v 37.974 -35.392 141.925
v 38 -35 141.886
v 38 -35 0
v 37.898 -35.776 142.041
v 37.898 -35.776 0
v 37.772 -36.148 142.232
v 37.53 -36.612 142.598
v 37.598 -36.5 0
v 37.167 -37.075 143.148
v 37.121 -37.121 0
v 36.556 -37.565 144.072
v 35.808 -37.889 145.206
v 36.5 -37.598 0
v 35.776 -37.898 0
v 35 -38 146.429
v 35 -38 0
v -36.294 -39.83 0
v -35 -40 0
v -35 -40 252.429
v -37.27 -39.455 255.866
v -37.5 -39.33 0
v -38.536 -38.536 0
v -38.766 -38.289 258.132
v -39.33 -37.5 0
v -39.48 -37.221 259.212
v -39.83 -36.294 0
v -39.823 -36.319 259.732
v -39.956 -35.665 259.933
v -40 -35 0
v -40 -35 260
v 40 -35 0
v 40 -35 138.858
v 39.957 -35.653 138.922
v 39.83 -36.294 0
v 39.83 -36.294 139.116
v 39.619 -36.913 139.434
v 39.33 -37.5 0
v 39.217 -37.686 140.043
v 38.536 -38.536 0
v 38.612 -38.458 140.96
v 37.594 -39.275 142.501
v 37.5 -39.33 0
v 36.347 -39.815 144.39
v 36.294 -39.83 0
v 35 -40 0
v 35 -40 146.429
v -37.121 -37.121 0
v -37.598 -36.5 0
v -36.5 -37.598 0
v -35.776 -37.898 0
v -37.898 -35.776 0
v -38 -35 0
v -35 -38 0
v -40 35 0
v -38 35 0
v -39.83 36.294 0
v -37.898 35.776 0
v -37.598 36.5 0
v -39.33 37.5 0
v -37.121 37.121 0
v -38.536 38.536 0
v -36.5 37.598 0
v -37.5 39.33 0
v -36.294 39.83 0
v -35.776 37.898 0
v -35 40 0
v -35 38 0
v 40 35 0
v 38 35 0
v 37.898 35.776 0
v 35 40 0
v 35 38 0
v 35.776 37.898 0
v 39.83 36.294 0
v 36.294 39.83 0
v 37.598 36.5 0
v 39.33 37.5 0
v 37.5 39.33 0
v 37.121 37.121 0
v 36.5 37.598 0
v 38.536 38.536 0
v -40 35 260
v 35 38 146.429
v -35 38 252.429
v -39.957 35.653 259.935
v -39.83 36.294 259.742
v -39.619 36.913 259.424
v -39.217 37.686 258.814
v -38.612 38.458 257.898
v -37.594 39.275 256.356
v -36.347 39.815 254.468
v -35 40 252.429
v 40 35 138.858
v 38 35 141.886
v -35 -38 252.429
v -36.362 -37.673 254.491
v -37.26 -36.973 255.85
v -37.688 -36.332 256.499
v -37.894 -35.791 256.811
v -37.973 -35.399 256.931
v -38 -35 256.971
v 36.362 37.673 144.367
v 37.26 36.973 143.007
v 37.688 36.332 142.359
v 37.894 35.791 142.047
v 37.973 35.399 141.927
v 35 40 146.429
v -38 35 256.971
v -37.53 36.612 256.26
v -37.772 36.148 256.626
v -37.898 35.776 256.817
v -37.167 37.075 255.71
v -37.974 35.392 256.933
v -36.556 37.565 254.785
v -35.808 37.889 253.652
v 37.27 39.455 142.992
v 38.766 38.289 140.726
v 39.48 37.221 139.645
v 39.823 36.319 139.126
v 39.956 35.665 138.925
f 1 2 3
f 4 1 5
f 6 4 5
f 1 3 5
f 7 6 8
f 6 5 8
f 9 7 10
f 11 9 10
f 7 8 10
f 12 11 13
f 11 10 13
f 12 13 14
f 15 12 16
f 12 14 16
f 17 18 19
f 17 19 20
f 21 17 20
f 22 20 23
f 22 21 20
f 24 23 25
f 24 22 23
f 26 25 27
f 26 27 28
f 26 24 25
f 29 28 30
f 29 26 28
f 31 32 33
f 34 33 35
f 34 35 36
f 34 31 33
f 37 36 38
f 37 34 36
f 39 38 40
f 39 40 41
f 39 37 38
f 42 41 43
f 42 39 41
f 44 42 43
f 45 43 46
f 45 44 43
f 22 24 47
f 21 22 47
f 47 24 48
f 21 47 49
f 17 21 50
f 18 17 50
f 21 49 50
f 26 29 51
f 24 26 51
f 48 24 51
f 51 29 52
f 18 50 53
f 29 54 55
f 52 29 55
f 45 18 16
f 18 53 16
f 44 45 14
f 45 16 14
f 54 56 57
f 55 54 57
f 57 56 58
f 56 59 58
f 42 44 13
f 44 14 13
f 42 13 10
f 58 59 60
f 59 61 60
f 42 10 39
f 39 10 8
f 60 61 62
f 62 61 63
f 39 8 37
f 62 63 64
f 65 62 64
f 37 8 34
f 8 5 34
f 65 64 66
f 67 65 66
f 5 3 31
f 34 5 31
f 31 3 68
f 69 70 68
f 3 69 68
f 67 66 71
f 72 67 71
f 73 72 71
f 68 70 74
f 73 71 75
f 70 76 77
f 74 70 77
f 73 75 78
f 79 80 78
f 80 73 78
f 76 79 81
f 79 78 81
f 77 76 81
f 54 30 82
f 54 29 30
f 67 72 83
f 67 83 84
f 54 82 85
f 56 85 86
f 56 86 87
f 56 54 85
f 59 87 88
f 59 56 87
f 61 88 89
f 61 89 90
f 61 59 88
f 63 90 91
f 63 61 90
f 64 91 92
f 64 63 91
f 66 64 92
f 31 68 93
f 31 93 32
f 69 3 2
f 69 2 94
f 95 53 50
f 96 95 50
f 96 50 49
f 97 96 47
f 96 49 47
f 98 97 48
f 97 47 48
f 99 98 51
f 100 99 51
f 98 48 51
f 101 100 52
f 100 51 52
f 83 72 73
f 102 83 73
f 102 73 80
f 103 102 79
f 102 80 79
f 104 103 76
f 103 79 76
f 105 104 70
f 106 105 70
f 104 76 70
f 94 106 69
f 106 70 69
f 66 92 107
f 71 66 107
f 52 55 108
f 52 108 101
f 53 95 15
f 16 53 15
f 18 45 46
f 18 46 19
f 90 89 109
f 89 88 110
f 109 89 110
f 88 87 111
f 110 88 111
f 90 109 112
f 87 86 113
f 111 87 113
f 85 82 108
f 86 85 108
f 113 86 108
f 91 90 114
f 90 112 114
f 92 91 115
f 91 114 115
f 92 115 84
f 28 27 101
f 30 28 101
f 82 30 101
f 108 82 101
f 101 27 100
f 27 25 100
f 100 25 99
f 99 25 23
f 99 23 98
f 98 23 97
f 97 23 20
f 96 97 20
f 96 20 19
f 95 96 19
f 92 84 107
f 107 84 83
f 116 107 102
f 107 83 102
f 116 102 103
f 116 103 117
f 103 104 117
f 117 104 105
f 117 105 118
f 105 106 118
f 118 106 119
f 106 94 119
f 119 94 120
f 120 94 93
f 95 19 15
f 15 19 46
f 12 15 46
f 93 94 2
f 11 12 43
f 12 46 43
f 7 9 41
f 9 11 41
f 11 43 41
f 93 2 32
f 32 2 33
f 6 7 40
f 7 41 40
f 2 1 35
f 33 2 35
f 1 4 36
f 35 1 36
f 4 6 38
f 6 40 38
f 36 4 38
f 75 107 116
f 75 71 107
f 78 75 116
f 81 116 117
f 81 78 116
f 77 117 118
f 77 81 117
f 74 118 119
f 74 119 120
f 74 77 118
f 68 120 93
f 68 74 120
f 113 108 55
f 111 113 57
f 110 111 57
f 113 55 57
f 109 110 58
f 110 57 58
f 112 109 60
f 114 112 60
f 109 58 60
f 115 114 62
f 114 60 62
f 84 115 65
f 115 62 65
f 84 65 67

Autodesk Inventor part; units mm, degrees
ref_plane "YZ Plane" through (0, 0, 0) normal (1, 0, 0) x (0, 1, 0)
ref_plane "XZ Plane" through (0, 0, 0) normal (0, 1, 0) x (-1, 0, 0)
ref_plane "XY Plane" through (0, 0, 0) normal (0, 0, 1) x (1, 0, 0)
sketch "Sketch1" plane through (0, 0, 0) normal (0, 0, 1) x (1, 0, 0)
  line L0 (-35, 40) -> (35, 40)
  line L1 (40, 35) -> (40, -35)
  line L2 (35, -40) -> (-35, -40)
  line L3 (-40, -35) -> (-40, 35)
  line L4 (-40, 40) -> (40, -40) construction
  line L5 (40, 40) -> (-40, -40) construction
  arc A0 (-35, 40) -> (-40, 35) centre (-35, 35) ccw
  arc A1 (40, 35) -> (35, 40) centre (35, 35) ccw
  arc A2 (35, -40) -> (40, -35) centre (35, -35) ccw
  arc A3 (-40, -35) -> (-35, -40) centre (-35, -35) ccw
  line L6 (35, 38) -> (-35, 38)
  arc A4 (-35, 38) -> (-38, 35) centre (-35, 35) ccw
  line L7 (-38, 35) -> (-38, -35)
  arc A5 (-38, -35) -> (-35, -38) centre (-35, -35) ccw
  line L8 (-35, -38) -> (35, -38)
  arc A6 (35, -38) -> (38, -35) centre (35, -35) ccw
  line L9 (38, -35) -> (38, 35)
  arc A7 (38, 35) -> (35, 38) centre (35, 35) ccw
  point P0 (0, 0)
  dimension "d0" = 80
  dimension "d1" = 5
  dimension "d2" = 2
extrude "Extrusion1" add sketch "Sketch1" along normal blind 260
sketch "Sketch2" plane through (0, 0, 0) normal (0, 1, 0) x (-1, 0, 0)
  line L0 (40, 0) -> (40, 260) projected
  line L1 (-40, 0) -> (-40, 260) projected
  line L2 (40, 260) -> (-40, 260)
  line L3 (40, 260) -> (-40, 138.8577)
  point P0 (0, 0)
  dimension "d5" = 123.44
extrude "Extrusion2" cut sketch "Sketch2" along normal through all both and the other way through all
properties part number "MSC 903 BASE TUBE"
